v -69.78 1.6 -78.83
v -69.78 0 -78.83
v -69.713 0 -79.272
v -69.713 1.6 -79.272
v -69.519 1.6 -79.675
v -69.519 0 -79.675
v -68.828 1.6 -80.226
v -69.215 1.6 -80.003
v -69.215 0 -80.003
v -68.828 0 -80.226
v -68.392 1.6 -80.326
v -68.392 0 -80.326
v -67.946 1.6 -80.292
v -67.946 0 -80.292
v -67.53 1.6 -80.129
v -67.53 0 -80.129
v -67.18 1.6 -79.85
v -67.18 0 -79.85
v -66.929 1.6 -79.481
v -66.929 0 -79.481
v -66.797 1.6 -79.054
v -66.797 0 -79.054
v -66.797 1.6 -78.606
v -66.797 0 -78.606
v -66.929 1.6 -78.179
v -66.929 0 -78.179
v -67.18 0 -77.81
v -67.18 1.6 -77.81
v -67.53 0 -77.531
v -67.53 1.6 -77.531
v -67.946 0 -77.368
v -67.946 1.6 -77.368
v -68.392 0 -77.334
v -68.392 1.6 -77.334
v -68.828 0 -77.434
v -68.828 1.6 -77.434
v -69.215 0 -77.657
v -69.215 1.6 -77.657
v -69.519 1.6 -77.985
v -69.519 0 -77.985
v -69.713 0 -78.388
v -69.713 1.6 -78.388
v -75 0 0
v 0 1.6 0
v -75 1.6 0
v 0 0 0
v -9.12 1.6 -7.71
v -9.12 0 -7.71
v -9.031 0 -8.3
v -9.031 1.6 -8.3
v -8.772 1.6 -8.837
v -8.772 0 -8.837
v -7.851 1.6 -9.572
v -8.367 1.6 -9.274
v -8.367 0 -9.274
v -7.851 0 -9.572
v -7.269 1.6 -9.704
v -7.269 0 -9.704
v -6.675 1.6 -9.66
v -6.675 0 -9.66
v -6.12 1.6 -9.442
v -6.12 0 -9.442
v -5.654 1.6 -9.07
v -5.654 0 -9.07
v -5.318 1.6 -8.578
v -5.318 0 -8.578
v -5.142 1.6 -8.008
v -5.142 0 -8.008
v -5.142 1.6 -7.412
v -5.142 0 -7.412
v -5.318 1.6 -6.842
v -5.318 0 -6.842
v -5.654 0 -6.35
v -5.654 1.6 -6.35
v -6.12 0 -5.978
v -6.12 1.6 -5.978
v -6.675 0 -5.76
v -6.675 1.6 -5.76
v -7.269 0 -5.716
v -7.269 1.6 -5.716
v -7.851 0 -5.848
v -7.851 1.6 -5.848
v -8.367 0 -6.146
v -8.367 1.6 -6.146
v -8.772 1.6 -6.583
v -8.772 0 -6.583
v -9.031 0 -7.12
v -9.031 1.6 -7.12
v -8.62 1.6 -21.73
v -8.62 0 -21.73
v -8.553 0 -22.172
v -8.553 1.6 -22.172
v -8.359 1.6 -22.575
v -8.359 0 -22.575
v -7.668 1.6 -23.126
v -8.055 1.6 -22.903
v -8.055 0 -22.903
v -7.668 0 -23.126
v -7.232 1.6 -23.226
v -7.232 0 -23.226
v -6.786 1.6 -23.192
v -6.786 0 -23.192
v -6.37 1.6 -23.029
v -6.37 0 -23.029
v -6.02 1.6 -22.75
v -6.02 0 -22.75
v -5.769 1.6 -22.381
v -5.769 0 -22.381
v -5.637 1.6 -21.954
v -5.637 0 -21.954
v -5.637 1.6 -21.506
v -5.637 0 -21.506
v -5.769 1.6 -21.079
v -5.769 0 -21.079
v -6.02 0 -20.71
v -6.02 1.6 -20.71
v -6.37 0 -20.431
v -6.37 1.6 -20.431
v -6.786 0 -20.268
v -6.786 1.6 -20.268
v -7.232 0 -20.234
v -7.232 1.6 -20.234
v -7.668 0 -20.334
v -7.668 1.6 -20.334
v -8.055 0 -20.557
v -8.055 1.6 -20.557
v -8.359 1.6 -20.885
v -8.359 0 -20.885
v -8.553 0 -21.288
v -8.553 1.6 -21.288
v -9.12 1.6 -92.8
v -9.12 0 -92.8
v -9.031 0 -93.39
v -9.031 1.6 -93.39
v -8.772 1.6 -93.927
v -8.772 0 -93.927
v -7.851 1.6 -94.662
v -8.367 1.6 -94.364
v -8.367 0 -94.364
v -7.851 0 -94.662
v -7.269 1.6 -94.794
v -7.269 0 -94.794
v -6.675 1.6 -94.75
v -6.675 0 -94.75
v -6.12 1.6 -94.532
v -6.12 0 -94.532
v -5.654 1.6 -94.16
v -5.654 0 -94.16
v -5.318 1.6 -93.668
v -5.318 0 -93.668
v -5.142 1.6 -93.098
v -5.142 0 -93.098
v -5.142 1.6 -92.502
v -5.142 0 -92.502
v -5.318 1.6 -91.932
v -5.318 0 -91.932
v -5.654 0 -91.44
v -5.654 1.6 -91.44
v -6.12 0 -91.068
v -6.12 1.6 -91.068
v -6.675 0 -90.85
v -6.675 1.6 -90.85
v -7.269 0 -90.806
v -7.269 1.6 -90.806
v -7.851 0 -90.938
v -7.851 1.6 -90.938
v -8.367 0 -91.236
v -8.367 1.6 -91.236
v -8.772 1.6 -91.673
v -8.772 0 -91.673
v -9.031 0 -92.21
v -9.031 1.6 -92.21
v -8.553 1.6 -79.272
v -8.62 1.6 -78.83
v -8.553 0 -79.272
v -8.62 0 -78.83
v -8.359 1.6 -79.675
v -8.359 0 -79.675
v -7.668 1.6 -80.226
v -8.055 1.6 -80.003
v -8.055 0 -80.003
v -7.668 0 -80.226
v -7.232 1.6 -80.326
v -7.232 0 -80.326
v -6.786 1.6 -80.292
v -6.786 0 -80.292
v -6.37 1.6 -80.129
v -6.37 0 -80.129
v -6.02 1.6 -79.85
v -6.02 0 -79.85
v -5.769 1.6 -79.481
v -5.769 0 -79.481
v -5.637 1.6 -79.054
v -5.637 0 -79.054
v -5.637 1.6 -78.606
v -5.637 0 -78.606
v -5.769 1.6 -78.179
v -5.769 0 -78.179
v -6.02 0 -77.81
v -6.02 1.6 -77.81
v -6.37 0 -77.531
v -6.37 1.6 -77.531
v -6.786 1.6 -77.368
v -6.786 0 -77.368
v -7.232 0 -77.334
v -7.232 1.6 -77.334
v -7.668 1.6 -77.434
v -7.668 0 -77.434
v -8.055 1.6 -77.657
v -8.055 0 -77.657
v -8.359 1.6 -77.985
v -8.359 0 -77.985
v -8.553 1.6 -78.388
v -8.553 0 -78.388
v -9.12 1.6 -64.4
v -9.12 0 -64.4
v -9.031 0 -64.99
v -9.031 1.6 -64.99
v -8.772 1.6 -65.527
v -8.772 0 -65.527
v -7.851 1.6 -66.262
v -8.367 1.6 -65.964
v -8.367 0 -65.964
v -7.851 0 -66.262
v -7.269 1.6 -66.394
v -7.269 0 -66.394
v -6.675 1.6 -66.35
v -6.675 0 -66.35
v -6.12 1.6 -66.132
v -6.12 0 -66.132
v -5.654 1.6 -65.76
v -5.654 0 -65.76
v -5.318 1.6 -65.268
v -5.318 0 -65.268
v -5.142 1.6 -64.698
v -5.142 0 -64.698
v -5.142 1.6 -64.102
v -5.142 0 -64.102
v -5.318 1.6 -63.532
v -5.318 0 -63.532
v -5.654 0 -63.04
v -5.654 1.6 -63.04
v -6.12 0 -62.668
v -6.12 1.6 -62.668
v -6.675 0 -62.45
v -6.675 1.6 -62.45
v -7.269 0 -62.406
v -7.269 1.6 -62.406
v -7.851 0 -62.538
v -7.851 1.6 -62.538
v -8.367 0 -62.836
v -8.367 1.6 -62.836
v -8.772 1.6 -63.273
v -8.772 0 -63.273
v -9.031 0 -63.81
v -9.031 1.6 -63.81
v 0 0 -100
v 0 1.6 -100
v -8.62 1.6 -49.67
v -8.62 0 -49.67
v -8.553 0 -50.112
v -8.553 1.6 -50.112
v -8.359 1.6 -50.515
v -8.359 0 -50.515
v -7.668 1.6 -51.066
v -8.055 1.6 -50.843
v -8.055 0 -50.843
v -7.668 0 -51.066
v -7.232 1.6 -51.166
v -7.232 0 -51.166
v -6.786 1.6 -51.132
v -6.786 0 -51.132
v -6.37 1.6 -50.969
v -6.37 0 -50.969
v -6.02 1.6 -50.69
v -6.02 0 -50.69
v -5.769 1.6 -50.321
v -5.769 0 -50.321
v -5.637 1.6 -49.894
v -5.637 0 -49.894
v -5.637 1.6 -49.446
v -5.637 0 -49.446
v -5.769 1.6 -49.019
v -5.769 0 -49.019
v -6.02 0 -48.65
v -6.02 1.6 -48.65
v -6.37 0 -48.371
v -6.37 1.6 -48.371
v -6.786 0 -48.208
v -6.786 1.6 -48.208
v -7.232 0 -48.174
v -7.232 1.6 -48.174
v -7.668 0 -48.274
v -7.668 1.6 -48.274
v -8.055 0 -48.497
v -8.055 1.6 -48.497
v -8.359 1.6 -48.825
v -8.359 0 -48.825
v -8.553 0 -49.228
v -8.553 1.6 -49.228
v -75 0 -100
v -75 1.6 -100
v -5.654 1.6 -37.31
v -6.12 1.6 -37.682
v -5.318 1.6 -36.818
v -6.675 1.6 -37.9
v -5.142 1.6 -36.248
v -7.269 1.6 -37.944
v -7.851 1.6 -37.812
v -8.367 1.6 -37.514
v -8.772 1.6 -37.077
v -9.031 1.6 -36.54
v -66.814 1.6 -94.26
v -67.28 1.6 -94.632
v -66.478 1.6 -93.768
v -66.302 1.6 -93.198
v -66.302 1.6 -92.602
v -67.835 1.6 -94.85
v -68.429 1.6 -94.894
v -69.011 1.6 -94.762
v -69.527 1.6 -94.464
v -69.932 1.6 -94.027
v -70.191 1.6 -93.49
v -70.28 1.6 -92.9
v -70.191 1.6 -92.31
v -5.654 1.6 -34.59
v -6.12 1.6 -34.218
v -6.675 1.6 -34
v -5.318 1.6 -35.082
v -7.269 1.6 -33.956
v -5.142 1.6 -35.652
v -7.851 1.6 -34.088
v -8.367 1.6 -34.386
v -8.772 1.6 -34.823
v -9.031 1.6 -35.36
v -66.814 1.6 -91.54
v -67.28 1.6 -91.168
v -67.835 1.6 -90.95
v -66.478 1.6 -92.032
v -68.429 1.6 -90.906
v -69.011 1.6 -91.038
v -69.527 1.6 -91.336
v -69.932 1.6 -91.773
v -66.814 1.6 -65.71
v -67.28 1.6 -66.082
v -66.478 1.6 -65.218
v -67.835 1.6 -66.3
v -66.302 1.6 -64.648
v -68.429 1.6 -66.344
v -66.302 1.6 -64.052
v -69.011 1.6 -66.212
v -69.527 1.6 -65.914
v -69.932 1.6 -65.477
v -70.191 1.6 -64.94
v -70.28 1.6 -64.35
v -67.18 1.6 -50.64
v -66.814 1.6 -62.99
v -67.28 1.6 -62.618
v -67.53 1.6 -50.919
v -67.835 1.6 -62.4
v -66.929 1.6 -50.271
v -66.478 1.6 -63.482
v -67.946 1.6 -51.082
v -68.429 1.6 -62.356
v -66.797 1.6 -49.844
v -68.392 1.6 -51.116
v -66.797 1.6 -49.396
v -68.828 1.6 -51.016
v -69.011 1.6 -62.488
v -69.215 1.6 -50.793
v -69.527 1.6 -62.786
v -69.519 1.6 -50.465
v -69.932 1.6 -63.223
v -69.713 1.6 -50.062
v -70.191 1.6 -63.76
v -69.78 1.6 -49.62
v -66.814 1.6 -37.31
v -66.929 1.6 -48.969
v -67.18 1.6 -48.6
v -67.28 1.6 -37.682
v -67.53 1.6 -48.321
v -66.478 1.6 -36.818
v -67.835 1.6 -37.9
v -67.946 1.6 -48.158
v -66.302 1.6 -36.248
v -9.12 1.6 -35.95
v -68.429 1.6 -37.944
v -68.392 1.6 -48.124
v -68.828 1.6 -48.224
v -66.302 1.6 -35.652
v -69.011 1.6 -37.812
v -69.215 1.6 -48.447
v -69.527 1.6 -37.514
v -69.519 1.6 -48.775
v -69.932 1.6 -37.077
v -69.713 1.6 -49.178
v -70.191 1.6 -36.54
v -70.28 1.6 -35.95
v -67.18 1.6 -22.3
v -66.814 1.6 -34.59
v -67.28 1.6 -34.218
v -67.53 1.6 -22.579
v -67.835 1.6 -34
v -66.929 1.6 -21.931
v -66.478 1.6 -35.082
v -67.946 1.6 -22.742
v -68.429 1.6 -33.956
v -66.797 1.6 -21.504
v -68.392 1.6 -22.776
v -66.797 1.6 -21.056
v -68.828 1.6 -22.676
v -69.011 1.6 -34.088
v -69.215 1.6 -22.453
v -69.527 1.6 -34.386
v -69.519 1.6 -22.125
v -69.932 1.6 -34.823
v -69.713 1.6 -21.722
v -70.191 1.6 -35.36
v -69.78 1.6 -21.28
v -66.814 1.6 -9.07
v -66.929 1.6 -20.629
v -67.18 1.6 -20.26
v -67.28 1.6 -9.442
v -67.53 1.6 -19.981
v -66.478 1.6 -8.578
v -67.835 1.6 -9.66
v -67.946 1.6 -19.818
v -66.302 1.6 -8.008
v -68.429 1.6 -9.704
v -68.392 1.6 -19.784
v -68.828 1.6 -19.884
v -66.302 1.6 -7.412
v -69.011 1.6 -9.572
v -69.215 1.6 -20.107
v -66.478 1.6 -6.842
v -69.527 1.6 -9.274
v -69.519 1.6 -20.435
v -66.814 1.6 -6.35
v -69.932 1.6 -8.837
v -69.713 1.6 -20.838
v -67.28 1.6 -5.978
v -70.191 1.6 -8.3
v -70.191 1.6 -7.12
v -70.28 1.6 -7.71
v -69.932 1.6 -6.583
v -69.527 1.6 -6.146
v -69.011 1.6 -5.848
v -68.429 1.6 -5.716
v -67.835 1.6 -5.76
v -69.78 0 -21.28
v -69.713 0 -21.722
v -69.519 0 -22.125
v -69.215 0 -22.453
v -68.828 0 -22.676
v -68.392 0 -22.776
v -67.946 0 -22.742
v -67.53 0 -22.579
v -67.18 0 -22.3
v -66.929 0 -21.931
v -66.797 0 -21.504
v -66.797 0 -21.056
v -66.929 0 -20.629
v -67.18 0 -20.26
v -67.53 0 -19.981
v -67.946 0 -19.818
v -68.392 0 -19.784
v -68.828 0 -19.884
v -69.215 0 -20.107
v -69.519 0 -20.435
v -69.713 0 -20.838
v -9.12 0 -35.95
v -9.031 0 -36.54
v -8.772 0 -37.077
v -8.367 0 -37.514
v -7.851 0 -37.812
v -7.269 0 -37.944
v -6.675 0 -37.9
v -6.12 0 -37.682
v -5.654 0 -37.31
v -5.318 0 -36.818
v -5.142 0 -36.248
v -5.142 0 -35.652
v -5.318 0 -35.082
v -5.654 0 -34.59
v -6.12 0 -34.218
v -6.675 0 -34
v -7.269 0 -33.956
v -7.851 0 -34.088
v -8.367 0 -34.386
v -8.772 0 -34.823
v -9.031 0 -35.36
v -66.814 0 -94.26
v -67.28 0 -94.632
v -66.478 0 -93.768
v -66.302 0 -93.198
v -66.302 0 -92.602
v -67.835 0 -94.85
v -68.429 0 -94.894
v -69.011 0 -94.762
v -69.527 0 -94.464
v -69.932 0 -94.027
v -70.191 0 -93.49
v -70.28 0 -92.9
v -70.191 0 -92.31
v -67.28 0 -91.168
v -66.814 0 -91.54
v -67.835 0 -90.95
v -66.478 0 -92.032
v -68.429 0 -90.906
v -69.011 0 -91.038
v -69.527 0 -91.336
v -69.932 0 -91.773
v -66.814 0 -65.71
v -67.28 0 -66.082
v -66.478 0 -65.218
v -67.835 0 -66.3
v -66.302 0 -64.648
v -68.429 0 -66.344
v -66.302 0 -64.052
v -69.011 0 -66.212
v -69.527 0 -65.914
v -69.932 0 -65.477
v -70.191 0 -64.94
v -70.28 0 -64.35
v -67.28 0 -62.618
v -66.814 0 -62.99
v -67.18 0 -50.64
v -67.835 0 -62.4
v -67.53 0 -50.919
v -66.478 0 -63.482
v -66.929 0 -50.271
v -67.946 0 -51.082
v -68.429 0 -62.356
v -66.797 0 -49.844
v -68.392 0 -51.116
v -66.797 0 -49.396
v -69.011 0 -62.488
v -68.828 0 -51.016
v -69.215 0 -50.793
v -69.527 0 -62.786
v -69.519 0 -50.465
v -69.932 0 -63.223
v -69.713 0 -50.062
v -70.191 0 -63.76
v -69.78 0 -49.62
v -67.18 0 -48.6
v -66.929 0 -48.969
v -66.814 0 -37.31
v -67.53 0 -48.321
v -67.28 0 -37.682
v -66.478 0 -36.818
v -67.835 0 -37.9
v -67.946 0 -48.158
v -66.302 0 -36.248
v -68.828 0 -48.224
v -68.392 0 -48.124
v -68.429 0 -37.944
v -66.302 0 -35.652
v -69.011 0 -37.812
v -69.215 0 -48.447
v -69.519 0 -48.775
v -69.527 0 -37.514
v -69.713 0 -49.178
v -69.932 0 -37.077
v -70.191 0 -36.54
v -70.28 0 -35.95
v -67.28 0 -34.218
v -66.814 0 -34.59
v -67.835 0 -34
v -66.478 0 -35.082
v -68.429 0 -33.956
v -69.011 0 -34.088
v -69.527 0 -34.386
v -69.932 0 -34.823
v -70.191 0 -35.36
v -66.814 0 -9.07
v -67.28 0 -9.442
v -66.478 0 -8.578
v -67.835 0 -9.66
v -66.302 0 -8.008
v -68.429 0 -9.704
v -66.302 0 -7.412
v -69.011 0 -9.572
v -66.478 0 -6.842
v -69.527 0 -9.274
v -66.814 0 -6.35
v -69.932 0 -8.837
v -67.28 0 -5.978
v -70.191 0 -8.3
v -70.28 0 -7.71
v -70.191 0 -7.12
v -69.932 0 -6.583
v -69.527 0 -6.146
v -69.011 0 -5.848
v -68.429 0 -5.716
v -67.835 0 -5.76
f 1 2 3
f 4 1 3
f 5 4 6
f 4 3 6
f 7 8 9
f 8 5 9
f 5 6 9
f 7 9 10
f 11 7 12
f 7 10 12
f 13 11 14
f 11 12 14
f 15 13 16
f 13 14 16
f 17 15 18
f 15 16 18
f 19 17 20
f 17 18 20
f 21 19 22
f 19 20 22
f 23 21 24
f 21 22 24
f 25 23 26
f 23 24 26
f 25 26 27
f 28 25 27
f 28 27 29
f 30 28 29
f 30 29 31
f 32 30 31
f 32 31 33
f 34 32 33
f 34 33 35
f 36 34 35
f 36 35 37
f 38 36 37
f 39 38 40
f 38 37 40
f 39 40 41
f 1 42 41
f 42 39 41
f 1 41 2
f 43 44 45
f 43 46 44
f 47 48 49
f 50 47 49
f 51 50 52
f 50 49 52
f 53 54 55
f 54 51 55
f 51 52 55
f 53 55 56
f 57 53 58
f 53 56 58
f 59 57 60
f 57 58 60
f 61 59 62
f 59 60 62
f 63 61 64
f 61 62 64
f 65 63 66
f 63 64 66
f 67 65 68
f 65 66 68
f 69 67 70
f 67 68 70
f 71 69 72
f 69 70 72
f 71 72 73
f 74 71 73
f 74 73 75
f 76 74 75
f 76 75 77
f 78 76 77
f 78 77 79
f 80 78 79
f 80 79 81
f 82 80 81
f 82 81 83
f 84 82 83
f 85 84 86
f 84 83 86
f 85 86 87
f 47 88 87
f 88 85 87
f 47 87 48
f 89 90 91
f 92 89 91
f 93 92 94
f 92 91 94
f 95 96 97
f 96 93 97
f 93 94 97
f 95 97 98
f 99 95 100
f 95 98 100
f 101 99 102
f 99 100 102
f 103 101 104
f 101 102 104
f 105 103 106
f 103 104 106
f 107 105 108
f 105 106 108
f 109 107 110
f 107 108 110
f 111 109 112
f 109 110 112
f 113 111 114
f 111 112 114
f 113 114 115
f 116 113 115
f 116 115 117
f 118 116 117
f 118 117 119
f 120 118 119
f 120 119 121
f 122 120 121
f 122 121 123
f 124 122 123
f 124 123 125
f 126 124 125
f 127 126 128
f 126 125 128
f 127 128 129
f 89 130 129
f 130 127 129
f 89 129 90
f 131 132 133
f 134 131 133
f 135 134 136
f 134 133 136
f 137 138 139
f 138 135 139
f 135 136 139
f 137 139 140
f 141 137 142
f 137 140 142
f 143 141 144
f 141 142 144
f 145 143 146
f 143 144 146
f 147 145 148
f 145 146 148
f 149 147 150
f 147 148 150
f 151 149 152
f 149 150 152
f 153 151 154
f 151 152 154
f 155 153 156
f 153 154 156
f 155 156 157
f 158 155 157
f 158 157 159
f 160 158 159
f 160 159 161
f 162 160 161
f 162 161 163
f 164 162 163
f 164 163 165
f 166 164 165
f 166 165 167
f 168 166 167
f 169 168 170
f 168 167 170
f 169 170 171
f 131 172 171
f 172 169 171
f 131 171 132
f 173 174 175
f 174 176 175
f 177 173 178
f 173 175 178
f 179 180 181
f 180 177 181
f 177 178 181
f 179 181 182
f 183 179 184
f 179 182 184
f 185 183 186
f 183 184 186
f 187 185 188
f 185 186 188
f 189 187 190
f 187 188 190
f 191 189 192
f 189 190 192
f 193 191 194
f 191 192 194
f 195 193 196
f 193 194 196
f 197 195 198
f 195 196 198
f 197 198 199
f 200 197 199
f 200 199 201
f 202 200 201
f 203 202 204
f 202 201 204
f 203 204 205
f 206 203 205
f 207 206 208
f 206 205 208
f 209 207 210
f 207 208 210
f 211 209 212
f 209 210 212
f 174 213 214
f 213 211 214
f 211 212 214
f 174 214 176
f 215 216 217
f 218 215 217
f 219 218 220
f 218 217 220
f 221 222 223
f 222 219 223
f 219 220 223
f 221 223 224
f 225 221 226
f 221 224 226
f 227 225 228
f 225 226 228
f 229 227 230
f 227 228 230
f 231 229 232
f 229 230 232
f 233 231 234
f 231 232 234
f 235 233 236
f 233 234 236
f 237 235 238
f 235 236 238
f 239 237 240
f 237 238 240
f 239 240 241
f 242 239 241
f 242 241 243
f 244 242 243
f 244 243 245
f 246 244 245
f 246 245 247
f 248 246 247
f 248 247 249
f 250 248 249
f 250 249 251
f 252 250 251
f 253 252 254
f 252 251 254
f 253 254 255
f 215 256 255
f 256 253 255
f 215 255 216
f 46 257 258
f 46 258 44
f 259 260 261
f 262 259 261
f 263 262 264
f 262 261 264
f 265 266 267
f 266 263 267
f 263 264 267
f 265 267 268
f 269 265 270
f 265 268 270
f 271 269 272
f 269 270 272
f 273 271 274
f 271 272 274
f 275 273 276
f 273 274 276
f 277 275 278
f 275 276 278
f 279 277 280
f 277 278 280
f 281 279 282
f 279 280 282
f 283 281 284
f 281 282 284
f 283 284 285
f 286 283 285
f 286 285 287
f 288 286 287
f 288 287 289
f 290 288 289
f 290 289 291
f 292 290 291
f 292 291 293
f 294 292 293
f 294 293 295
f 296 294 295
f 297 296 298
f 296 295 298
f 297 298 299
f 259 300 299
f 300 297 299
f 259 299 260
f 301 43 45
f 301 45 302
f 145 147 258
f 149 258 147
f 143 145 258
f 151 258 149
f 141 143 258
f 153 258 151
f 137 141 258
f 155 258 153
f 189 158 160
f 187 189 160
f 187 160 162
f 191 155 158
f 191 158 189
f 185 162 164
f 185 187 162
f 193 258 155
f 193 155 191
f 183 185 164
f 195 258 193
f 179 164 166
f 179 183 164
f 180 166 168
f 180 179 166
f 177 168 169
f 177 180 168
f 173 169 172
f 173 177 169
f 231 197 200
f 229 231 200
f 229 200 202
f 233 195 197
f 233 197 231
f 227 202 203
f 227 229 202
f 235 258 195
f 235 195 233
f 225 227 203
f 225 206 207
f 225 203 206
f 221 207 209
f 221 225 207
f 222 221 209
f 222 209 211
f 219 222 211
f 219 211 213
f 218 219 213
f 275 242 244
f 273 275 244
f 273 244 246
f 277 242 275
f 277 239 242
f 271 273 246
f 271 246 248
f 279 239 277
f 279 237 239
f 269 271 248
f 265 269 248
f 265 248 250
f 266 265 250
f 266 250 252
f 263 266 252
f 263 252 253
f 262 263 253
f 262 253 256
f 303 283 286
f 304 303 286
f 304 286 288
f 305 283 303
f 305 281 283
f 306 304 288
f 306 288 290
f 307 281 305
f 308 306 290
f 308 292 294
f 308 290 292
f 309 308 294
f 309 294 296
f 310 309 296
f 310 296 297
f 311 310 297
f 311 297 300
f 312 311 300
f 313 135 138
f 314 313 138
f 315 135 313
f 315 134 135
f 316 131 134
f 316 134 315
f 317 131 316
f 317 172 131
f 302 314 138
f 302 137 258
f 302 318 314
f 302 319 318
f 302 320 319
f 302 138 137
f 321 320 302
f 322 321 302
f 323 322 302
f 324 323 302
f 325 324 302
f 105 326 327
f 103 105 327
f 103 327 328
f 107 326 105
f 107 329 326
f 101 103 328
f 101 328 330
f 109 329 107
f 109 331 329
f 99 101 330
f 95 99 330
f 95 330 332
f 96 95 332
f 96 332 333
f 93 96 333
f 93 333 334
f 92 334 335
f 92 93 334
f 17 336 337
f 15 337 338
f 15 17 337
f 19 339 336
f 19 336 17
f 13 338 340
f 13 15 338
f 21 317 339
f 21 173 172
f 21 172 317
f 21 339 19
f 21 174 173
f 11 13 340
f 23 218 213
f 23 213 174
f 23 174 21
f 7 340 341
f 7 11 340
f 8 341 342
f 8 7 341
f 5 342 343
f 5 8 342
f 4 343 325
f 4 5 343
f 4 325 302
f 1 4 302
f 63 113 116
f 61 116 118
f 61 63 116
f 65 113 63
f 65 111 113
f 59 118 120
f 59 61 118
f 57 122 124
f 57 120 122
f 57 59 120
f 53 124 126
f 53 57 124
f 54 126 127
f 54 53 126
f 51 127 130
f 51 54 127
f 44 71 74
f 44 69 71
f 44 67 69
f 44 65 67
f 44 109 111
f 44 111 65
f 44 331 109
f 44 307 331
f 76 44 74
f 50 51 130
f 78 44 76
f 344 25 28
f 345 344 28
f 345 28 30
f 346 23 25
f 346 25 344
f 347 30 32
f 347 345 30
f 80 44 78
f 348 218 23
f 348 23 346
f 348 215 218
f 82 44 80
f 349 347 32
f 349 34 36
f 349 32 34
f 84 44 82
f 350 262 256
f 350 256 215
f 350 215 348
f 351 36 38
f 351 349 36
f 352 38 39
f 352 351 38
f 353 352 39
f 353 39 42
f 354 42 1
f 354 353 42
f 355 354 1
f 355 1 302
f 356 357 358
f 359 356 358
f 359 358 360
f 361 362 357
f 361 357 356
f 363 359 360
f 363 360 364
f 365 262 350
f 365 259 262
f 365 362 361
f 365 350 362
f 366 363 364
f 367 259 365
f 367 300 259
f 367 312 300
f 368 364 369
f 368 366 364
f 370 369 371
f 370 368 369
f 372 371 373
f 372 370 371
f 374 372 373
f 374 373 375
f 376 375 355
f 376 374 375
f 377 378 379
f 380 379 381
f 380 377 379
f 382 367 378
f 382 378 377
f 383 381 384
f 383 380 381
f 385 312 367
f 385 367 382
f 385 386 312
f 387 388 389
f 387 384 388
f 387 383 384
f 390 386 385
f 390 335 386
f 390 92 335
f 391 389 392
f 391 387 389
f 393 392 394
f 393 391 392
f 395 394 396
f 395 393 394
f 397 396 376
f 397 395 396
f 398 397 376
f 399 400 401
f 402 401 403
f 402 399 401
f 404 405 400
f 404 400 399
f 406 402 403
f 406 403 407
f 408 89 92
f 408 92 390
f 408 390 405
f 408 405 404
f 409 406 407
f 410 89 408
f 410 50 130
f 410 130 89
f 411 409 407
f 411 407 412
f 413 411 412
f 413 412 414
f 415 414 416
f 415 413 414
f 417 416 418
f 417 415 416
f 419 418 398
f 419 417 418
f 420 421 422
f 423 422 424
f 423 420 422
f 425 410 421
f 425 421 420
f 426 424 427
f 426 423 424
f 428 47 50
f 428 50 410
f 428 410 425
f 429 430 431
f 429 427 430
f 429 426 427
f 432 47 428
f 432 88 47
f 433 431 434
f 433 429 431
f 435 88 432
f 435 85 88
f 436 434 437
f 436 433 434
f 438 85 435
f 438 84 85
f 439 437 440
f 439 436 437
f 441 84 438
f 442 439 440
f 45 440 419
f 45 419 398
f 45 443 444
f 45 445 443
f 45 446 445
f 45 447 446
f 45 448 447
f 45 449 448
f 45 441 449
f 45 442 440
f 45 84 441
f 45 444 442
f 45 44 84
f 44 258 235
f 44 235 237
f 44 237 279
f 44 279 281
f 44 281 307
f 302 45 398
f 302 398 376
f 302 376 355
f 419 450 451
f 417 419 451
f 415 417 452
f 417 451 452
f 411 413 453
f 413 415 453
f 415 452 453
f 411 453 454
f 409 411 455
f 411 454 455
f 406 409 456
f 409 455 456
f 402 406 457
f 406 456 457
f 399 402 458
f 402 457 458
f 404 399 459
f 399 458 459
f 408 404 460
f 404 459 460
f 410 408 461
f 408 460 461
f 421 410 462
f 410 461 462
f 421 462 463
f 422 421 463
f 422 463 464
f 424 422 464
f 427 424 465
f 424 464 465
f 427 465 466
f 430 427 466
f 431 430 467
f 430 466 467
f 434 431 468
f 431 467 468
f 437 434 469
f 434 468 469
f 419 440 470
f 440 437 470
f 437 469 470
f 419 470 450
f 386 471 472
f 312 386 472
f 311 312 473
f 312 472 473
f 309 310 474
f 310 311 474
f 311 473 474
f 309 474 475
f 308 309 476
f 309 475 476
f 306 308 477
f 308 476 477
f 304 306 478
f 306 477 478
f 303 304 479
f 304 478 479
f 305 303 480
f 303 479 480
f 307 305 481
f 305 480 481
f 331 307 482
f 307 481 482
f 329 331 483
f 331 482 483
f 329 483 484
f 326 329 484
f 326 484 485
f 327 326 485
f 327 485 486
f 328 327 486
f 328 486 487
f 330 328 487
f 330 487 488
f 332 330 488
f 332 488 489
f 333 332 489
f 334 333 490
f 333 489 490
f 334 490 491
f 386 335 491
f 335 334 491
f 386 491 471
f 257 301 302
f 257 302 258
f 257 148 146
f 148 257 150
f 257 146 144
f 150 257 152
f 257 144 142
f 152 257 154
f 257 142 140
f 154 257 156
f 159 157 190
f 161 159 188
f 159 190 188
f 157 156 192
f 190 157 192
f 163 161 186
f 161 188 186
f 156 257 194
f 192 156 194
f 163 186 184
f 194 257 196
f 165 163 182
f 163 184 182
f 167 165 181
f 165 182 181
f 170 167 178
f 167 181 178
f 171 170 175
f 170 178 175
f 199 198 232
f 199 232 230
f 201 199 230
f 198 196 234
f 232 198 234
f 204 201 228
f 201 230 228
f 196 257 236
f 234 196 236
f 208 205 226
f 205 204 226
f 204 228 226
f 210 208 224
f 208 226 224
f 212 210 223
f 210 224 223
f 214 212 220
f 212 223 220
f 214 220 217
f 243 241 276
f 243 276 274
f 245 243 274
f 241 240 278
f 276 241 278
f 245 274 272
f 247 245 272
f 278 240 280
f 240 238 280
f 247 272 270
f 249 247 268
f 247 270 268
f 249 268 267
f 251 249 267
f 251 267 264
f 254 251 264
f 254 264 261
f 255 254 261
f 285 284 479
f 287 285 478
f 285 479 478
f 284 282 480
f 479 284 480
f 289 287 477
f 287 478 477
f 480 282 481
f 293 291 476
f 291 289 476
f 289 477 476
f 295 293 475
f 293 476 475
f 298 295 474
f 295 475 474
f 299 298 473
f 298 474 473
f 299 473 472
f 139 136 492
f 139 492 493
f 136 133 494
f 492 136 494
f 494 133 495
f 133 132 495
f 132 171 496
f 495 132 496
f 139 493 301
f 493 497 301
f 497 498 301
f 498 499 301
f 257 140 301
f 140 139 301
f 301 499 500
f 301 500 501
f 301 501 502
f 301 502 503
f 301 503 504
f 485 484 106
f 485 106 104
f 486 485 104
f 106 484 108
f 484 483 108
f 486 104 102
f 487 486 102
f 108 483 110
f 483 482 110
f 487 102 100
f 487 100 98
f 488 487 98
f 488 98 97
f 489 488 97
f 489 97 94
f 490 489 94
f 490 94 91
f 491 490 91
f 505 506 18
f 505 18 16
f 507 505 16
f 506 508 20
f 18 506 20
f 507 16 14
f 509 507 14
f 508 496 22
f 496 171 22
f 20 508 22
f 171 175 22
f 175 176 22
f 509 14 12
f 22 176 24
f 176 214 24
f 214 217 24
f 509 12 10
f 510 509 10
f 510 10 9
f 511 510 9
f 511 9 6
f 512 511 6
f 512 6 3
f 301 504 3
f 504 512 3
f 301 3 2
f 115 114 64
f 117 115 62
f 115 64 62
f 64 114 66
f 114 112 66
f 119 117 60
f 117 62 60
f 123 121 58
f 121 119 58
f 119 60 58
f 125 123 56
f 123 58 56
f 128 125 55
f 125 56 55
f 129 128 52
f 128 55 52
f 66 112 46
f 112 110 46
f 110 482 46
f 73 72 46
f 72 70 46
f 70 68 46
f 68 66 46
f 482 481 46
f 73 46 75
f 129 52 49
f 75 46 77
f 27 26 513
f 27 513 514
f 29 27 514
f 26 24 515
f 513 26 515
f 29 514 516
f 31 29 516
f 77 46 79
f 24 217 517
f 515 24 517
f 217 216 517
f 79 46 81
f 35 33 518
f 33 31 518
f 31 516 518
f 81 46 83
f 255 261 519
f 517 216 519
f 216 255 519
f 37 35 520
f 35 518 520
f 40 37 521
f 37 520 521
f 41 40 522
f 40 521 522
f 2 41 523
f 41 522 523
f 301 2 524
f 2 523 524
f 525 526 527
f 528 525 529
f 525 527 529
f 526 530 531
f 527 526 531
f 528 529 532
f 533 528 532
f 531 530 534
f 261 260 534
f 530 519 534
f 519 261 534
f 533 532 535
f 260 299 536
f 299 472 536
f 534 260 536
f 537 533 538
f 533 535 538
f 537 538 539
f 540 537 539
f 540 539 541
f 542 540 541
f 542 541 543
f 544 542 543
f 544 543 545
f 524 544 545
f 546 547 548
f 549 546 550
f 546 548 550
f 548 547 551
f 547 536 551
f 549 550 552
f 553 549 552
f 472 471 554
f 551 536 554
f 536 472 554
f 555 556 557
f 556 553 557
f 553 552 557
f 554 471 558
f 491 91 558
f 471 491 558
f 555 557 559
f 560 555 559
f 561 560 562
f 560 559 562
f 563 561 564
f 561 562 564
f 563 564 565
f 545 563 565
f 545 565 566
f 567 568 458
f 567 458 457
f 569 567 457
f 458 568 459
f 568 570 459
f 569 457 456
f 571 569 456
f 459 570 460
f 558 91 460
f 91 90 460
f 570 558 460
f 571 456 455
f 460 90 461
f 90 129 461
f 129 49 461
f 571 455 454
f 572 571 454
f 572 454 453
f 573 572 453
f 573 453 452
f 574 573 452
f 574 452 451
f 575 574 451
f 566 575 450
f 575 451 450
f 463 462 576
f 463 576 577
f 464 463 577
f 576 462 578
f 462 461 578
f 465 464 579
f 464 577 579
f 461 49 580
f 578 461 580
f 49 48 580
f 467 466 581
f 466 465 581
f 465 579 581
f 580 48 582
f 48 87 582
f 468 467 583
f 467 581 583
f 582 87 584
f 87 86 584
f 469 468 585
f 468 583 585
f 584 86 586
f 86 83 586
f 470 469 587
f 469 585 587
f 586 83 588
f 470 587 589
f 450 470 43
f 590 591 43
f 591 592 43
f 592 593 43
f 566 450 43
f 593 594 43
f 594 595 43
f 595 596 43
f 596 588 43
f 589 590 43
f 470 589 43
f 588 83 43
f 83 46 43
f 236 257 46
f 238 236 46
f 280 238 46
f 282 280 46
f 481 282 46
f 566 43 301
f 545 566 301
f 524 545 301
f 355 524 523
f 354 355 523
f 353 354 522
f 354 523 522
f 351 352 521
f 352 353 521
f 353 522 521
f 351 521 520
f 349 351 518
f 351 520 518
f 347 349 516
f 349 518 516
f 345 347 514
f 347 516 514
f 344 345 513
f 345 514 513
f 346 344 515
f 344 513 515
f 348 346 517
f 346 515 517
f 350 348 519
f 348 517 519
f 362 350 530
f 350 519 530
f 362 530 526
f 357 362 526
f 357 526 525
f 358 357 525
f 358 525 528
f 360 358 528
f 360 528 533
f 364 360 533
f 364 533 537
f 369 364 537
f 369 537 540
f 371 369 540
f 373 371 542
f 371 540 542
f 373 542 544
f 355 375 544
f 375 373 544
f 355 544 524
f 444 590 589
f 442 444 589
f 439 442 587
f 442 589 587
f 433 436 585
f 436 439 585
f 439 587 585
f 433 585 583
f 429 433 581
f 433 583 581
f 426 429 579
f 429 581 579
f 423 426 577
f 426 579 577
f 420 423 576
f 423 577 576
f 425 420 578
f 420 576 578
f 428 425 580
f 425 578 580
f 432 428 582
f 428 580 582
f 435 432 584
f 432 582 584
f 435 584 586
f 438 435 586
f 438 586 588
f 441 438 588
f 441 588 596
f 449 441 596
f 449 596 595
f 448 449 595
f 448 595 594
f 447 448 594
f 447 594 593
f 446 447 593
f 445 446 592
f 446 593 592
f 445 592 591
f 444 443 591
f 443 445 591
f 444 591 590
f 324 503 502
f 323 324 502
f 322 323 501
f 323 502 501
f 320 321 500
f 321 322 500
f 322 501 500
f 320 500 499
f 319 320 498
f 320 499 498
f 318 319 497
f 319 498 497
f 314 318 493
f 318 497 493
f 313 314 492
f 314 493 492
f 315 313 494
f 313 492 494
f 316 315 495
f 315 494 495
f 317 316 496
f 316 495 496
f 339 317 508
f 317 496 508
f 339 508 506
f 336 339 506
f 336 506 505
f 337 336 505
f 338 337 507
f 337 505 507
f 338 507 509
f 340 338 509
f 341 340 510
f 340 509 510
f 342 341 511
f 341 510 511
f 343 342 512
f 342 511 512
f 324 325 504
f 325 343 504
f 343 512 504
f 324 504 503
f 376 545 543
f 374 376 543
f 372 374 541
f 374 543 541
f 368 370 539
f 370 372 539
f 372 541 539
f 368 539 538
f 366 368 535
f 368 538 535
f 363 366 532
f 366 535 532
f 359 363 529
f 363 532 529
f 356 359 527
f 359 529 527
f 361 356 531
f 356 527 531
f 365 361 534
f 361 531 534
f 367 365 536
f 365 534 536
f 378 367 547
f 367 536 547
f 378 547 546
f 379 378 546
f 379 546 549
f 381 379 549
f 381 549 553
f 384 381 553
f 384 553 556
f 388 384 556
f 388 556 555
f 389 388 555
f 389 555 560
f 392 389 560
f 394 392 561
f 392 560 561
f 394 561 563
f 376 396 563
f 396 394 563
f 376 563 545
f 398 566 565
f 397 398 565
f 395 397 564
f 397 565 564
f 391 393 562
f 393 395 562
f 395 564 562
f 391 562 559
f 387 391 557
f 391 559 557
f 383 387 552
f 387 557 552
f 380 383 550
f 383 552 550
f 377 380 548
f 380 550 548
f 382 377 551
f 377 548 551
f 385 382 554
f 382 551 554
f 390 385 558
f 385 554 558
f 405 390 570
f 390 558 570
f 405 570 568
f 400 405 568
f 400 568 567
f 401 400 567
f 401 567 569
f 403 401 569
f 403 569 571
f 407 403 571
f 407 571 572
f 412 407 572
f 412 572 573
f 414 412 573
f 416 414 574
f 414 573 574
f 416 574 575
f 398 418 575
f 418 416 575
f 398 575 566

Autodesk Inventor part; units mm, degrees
ref_plane "YZ Plane" through (0, 0, 0) normal (1, 0, 0) x (0, 1, 0)
ref_plane "XZ Plane" through (0, 0, 0) normal (0, 1, 0) x (-1, 0, 0)
ref_plane "XY Plane" through (0, 0, 0) normal (0, 0, 1) x (1, 0, 0)
sketch "Sketch1" plane through (0, 0, 0) normal (0, 1, 0) x (-1, 0, 0)
  line L0 (0, 0) -> (75, 0)
  line L1 (75, 0) -> (75, -100)
  line L2 (75, -100) -> (0, -100)
  line L3 (0, -100) -> (0, 0)
  circle A0 centre (68.28, -7.71) radius 2
  circle A1 centre (68.28, -35.95) radius 2
  circle A2 centre (68.28, -64.35) radius 2
  circle A3 centre (68.28, -92.9) radius 2
  circle A4 centre (7.12, -7.71) radius 2
  circle A5 centre (7.12, -35.95) radius 2
  circle A6 centre (7.12, -64.4) radius 2
  circle A7 centre (7.12, -92.8) radius 2
  circle A8 centre (7.12, -21.73) radius 1.5
  circle A9 centre (7.12, -49.67) radius 1.5
  circle A10 centre (7.12, -78.83) radius 1.5
  circle A11 centre (68.28, -21.28) radius 1.5
  circle A12 centre (68.28, -49.62) radius 1.5
  circle A13 centre (68.28, -78.83) radius 1.5
  line L4 (68.28, 0) -> (68.28, -100) construction
  line L5 (7.12, 0) -> (7.12, -100) construction
  dimension "d0" = 75
  dimension "d1" = 100
  dimension "d2" = 7.12
  dimension "d3" = 6.72
  dimension "d4" = 4
  dimension "d5" = 3
  dimension "d6" = 4
  dimension "d7" = 3
  dimension "d8" = 4
  dimension "d9" = 3
  dimension "d10" = 4
  dimension "d11" = 4
  dimension "d12" = 3
  dimension "d13" = 4
  dimension "d14" = 3
  dimension "d15" = 4
  dimension "d16" = 3
  dimension "d17" = 4
  dimension "d18" = 7.71
  dimension "d19" = 21.73
  dimension "d20" = 35.95
  dimension "d21" = 49.67
  dimension "d22" = 64.4
  dimension "d23" = 78.83
  dimension "d24" = 92.8
  dimension "d25" = 7.71
  dimension "d26" = 21.28
  dimension "d27" = 35.95
  dimension "d28" = 49.62
  dimension "d29" = 64.35
  dimension "d30" = 78.83
  dimension "d31" = 92.9
extrude "Extrusion1" add sketch "Sketch1" along normal blind 1.6
properties part number "Placa"
